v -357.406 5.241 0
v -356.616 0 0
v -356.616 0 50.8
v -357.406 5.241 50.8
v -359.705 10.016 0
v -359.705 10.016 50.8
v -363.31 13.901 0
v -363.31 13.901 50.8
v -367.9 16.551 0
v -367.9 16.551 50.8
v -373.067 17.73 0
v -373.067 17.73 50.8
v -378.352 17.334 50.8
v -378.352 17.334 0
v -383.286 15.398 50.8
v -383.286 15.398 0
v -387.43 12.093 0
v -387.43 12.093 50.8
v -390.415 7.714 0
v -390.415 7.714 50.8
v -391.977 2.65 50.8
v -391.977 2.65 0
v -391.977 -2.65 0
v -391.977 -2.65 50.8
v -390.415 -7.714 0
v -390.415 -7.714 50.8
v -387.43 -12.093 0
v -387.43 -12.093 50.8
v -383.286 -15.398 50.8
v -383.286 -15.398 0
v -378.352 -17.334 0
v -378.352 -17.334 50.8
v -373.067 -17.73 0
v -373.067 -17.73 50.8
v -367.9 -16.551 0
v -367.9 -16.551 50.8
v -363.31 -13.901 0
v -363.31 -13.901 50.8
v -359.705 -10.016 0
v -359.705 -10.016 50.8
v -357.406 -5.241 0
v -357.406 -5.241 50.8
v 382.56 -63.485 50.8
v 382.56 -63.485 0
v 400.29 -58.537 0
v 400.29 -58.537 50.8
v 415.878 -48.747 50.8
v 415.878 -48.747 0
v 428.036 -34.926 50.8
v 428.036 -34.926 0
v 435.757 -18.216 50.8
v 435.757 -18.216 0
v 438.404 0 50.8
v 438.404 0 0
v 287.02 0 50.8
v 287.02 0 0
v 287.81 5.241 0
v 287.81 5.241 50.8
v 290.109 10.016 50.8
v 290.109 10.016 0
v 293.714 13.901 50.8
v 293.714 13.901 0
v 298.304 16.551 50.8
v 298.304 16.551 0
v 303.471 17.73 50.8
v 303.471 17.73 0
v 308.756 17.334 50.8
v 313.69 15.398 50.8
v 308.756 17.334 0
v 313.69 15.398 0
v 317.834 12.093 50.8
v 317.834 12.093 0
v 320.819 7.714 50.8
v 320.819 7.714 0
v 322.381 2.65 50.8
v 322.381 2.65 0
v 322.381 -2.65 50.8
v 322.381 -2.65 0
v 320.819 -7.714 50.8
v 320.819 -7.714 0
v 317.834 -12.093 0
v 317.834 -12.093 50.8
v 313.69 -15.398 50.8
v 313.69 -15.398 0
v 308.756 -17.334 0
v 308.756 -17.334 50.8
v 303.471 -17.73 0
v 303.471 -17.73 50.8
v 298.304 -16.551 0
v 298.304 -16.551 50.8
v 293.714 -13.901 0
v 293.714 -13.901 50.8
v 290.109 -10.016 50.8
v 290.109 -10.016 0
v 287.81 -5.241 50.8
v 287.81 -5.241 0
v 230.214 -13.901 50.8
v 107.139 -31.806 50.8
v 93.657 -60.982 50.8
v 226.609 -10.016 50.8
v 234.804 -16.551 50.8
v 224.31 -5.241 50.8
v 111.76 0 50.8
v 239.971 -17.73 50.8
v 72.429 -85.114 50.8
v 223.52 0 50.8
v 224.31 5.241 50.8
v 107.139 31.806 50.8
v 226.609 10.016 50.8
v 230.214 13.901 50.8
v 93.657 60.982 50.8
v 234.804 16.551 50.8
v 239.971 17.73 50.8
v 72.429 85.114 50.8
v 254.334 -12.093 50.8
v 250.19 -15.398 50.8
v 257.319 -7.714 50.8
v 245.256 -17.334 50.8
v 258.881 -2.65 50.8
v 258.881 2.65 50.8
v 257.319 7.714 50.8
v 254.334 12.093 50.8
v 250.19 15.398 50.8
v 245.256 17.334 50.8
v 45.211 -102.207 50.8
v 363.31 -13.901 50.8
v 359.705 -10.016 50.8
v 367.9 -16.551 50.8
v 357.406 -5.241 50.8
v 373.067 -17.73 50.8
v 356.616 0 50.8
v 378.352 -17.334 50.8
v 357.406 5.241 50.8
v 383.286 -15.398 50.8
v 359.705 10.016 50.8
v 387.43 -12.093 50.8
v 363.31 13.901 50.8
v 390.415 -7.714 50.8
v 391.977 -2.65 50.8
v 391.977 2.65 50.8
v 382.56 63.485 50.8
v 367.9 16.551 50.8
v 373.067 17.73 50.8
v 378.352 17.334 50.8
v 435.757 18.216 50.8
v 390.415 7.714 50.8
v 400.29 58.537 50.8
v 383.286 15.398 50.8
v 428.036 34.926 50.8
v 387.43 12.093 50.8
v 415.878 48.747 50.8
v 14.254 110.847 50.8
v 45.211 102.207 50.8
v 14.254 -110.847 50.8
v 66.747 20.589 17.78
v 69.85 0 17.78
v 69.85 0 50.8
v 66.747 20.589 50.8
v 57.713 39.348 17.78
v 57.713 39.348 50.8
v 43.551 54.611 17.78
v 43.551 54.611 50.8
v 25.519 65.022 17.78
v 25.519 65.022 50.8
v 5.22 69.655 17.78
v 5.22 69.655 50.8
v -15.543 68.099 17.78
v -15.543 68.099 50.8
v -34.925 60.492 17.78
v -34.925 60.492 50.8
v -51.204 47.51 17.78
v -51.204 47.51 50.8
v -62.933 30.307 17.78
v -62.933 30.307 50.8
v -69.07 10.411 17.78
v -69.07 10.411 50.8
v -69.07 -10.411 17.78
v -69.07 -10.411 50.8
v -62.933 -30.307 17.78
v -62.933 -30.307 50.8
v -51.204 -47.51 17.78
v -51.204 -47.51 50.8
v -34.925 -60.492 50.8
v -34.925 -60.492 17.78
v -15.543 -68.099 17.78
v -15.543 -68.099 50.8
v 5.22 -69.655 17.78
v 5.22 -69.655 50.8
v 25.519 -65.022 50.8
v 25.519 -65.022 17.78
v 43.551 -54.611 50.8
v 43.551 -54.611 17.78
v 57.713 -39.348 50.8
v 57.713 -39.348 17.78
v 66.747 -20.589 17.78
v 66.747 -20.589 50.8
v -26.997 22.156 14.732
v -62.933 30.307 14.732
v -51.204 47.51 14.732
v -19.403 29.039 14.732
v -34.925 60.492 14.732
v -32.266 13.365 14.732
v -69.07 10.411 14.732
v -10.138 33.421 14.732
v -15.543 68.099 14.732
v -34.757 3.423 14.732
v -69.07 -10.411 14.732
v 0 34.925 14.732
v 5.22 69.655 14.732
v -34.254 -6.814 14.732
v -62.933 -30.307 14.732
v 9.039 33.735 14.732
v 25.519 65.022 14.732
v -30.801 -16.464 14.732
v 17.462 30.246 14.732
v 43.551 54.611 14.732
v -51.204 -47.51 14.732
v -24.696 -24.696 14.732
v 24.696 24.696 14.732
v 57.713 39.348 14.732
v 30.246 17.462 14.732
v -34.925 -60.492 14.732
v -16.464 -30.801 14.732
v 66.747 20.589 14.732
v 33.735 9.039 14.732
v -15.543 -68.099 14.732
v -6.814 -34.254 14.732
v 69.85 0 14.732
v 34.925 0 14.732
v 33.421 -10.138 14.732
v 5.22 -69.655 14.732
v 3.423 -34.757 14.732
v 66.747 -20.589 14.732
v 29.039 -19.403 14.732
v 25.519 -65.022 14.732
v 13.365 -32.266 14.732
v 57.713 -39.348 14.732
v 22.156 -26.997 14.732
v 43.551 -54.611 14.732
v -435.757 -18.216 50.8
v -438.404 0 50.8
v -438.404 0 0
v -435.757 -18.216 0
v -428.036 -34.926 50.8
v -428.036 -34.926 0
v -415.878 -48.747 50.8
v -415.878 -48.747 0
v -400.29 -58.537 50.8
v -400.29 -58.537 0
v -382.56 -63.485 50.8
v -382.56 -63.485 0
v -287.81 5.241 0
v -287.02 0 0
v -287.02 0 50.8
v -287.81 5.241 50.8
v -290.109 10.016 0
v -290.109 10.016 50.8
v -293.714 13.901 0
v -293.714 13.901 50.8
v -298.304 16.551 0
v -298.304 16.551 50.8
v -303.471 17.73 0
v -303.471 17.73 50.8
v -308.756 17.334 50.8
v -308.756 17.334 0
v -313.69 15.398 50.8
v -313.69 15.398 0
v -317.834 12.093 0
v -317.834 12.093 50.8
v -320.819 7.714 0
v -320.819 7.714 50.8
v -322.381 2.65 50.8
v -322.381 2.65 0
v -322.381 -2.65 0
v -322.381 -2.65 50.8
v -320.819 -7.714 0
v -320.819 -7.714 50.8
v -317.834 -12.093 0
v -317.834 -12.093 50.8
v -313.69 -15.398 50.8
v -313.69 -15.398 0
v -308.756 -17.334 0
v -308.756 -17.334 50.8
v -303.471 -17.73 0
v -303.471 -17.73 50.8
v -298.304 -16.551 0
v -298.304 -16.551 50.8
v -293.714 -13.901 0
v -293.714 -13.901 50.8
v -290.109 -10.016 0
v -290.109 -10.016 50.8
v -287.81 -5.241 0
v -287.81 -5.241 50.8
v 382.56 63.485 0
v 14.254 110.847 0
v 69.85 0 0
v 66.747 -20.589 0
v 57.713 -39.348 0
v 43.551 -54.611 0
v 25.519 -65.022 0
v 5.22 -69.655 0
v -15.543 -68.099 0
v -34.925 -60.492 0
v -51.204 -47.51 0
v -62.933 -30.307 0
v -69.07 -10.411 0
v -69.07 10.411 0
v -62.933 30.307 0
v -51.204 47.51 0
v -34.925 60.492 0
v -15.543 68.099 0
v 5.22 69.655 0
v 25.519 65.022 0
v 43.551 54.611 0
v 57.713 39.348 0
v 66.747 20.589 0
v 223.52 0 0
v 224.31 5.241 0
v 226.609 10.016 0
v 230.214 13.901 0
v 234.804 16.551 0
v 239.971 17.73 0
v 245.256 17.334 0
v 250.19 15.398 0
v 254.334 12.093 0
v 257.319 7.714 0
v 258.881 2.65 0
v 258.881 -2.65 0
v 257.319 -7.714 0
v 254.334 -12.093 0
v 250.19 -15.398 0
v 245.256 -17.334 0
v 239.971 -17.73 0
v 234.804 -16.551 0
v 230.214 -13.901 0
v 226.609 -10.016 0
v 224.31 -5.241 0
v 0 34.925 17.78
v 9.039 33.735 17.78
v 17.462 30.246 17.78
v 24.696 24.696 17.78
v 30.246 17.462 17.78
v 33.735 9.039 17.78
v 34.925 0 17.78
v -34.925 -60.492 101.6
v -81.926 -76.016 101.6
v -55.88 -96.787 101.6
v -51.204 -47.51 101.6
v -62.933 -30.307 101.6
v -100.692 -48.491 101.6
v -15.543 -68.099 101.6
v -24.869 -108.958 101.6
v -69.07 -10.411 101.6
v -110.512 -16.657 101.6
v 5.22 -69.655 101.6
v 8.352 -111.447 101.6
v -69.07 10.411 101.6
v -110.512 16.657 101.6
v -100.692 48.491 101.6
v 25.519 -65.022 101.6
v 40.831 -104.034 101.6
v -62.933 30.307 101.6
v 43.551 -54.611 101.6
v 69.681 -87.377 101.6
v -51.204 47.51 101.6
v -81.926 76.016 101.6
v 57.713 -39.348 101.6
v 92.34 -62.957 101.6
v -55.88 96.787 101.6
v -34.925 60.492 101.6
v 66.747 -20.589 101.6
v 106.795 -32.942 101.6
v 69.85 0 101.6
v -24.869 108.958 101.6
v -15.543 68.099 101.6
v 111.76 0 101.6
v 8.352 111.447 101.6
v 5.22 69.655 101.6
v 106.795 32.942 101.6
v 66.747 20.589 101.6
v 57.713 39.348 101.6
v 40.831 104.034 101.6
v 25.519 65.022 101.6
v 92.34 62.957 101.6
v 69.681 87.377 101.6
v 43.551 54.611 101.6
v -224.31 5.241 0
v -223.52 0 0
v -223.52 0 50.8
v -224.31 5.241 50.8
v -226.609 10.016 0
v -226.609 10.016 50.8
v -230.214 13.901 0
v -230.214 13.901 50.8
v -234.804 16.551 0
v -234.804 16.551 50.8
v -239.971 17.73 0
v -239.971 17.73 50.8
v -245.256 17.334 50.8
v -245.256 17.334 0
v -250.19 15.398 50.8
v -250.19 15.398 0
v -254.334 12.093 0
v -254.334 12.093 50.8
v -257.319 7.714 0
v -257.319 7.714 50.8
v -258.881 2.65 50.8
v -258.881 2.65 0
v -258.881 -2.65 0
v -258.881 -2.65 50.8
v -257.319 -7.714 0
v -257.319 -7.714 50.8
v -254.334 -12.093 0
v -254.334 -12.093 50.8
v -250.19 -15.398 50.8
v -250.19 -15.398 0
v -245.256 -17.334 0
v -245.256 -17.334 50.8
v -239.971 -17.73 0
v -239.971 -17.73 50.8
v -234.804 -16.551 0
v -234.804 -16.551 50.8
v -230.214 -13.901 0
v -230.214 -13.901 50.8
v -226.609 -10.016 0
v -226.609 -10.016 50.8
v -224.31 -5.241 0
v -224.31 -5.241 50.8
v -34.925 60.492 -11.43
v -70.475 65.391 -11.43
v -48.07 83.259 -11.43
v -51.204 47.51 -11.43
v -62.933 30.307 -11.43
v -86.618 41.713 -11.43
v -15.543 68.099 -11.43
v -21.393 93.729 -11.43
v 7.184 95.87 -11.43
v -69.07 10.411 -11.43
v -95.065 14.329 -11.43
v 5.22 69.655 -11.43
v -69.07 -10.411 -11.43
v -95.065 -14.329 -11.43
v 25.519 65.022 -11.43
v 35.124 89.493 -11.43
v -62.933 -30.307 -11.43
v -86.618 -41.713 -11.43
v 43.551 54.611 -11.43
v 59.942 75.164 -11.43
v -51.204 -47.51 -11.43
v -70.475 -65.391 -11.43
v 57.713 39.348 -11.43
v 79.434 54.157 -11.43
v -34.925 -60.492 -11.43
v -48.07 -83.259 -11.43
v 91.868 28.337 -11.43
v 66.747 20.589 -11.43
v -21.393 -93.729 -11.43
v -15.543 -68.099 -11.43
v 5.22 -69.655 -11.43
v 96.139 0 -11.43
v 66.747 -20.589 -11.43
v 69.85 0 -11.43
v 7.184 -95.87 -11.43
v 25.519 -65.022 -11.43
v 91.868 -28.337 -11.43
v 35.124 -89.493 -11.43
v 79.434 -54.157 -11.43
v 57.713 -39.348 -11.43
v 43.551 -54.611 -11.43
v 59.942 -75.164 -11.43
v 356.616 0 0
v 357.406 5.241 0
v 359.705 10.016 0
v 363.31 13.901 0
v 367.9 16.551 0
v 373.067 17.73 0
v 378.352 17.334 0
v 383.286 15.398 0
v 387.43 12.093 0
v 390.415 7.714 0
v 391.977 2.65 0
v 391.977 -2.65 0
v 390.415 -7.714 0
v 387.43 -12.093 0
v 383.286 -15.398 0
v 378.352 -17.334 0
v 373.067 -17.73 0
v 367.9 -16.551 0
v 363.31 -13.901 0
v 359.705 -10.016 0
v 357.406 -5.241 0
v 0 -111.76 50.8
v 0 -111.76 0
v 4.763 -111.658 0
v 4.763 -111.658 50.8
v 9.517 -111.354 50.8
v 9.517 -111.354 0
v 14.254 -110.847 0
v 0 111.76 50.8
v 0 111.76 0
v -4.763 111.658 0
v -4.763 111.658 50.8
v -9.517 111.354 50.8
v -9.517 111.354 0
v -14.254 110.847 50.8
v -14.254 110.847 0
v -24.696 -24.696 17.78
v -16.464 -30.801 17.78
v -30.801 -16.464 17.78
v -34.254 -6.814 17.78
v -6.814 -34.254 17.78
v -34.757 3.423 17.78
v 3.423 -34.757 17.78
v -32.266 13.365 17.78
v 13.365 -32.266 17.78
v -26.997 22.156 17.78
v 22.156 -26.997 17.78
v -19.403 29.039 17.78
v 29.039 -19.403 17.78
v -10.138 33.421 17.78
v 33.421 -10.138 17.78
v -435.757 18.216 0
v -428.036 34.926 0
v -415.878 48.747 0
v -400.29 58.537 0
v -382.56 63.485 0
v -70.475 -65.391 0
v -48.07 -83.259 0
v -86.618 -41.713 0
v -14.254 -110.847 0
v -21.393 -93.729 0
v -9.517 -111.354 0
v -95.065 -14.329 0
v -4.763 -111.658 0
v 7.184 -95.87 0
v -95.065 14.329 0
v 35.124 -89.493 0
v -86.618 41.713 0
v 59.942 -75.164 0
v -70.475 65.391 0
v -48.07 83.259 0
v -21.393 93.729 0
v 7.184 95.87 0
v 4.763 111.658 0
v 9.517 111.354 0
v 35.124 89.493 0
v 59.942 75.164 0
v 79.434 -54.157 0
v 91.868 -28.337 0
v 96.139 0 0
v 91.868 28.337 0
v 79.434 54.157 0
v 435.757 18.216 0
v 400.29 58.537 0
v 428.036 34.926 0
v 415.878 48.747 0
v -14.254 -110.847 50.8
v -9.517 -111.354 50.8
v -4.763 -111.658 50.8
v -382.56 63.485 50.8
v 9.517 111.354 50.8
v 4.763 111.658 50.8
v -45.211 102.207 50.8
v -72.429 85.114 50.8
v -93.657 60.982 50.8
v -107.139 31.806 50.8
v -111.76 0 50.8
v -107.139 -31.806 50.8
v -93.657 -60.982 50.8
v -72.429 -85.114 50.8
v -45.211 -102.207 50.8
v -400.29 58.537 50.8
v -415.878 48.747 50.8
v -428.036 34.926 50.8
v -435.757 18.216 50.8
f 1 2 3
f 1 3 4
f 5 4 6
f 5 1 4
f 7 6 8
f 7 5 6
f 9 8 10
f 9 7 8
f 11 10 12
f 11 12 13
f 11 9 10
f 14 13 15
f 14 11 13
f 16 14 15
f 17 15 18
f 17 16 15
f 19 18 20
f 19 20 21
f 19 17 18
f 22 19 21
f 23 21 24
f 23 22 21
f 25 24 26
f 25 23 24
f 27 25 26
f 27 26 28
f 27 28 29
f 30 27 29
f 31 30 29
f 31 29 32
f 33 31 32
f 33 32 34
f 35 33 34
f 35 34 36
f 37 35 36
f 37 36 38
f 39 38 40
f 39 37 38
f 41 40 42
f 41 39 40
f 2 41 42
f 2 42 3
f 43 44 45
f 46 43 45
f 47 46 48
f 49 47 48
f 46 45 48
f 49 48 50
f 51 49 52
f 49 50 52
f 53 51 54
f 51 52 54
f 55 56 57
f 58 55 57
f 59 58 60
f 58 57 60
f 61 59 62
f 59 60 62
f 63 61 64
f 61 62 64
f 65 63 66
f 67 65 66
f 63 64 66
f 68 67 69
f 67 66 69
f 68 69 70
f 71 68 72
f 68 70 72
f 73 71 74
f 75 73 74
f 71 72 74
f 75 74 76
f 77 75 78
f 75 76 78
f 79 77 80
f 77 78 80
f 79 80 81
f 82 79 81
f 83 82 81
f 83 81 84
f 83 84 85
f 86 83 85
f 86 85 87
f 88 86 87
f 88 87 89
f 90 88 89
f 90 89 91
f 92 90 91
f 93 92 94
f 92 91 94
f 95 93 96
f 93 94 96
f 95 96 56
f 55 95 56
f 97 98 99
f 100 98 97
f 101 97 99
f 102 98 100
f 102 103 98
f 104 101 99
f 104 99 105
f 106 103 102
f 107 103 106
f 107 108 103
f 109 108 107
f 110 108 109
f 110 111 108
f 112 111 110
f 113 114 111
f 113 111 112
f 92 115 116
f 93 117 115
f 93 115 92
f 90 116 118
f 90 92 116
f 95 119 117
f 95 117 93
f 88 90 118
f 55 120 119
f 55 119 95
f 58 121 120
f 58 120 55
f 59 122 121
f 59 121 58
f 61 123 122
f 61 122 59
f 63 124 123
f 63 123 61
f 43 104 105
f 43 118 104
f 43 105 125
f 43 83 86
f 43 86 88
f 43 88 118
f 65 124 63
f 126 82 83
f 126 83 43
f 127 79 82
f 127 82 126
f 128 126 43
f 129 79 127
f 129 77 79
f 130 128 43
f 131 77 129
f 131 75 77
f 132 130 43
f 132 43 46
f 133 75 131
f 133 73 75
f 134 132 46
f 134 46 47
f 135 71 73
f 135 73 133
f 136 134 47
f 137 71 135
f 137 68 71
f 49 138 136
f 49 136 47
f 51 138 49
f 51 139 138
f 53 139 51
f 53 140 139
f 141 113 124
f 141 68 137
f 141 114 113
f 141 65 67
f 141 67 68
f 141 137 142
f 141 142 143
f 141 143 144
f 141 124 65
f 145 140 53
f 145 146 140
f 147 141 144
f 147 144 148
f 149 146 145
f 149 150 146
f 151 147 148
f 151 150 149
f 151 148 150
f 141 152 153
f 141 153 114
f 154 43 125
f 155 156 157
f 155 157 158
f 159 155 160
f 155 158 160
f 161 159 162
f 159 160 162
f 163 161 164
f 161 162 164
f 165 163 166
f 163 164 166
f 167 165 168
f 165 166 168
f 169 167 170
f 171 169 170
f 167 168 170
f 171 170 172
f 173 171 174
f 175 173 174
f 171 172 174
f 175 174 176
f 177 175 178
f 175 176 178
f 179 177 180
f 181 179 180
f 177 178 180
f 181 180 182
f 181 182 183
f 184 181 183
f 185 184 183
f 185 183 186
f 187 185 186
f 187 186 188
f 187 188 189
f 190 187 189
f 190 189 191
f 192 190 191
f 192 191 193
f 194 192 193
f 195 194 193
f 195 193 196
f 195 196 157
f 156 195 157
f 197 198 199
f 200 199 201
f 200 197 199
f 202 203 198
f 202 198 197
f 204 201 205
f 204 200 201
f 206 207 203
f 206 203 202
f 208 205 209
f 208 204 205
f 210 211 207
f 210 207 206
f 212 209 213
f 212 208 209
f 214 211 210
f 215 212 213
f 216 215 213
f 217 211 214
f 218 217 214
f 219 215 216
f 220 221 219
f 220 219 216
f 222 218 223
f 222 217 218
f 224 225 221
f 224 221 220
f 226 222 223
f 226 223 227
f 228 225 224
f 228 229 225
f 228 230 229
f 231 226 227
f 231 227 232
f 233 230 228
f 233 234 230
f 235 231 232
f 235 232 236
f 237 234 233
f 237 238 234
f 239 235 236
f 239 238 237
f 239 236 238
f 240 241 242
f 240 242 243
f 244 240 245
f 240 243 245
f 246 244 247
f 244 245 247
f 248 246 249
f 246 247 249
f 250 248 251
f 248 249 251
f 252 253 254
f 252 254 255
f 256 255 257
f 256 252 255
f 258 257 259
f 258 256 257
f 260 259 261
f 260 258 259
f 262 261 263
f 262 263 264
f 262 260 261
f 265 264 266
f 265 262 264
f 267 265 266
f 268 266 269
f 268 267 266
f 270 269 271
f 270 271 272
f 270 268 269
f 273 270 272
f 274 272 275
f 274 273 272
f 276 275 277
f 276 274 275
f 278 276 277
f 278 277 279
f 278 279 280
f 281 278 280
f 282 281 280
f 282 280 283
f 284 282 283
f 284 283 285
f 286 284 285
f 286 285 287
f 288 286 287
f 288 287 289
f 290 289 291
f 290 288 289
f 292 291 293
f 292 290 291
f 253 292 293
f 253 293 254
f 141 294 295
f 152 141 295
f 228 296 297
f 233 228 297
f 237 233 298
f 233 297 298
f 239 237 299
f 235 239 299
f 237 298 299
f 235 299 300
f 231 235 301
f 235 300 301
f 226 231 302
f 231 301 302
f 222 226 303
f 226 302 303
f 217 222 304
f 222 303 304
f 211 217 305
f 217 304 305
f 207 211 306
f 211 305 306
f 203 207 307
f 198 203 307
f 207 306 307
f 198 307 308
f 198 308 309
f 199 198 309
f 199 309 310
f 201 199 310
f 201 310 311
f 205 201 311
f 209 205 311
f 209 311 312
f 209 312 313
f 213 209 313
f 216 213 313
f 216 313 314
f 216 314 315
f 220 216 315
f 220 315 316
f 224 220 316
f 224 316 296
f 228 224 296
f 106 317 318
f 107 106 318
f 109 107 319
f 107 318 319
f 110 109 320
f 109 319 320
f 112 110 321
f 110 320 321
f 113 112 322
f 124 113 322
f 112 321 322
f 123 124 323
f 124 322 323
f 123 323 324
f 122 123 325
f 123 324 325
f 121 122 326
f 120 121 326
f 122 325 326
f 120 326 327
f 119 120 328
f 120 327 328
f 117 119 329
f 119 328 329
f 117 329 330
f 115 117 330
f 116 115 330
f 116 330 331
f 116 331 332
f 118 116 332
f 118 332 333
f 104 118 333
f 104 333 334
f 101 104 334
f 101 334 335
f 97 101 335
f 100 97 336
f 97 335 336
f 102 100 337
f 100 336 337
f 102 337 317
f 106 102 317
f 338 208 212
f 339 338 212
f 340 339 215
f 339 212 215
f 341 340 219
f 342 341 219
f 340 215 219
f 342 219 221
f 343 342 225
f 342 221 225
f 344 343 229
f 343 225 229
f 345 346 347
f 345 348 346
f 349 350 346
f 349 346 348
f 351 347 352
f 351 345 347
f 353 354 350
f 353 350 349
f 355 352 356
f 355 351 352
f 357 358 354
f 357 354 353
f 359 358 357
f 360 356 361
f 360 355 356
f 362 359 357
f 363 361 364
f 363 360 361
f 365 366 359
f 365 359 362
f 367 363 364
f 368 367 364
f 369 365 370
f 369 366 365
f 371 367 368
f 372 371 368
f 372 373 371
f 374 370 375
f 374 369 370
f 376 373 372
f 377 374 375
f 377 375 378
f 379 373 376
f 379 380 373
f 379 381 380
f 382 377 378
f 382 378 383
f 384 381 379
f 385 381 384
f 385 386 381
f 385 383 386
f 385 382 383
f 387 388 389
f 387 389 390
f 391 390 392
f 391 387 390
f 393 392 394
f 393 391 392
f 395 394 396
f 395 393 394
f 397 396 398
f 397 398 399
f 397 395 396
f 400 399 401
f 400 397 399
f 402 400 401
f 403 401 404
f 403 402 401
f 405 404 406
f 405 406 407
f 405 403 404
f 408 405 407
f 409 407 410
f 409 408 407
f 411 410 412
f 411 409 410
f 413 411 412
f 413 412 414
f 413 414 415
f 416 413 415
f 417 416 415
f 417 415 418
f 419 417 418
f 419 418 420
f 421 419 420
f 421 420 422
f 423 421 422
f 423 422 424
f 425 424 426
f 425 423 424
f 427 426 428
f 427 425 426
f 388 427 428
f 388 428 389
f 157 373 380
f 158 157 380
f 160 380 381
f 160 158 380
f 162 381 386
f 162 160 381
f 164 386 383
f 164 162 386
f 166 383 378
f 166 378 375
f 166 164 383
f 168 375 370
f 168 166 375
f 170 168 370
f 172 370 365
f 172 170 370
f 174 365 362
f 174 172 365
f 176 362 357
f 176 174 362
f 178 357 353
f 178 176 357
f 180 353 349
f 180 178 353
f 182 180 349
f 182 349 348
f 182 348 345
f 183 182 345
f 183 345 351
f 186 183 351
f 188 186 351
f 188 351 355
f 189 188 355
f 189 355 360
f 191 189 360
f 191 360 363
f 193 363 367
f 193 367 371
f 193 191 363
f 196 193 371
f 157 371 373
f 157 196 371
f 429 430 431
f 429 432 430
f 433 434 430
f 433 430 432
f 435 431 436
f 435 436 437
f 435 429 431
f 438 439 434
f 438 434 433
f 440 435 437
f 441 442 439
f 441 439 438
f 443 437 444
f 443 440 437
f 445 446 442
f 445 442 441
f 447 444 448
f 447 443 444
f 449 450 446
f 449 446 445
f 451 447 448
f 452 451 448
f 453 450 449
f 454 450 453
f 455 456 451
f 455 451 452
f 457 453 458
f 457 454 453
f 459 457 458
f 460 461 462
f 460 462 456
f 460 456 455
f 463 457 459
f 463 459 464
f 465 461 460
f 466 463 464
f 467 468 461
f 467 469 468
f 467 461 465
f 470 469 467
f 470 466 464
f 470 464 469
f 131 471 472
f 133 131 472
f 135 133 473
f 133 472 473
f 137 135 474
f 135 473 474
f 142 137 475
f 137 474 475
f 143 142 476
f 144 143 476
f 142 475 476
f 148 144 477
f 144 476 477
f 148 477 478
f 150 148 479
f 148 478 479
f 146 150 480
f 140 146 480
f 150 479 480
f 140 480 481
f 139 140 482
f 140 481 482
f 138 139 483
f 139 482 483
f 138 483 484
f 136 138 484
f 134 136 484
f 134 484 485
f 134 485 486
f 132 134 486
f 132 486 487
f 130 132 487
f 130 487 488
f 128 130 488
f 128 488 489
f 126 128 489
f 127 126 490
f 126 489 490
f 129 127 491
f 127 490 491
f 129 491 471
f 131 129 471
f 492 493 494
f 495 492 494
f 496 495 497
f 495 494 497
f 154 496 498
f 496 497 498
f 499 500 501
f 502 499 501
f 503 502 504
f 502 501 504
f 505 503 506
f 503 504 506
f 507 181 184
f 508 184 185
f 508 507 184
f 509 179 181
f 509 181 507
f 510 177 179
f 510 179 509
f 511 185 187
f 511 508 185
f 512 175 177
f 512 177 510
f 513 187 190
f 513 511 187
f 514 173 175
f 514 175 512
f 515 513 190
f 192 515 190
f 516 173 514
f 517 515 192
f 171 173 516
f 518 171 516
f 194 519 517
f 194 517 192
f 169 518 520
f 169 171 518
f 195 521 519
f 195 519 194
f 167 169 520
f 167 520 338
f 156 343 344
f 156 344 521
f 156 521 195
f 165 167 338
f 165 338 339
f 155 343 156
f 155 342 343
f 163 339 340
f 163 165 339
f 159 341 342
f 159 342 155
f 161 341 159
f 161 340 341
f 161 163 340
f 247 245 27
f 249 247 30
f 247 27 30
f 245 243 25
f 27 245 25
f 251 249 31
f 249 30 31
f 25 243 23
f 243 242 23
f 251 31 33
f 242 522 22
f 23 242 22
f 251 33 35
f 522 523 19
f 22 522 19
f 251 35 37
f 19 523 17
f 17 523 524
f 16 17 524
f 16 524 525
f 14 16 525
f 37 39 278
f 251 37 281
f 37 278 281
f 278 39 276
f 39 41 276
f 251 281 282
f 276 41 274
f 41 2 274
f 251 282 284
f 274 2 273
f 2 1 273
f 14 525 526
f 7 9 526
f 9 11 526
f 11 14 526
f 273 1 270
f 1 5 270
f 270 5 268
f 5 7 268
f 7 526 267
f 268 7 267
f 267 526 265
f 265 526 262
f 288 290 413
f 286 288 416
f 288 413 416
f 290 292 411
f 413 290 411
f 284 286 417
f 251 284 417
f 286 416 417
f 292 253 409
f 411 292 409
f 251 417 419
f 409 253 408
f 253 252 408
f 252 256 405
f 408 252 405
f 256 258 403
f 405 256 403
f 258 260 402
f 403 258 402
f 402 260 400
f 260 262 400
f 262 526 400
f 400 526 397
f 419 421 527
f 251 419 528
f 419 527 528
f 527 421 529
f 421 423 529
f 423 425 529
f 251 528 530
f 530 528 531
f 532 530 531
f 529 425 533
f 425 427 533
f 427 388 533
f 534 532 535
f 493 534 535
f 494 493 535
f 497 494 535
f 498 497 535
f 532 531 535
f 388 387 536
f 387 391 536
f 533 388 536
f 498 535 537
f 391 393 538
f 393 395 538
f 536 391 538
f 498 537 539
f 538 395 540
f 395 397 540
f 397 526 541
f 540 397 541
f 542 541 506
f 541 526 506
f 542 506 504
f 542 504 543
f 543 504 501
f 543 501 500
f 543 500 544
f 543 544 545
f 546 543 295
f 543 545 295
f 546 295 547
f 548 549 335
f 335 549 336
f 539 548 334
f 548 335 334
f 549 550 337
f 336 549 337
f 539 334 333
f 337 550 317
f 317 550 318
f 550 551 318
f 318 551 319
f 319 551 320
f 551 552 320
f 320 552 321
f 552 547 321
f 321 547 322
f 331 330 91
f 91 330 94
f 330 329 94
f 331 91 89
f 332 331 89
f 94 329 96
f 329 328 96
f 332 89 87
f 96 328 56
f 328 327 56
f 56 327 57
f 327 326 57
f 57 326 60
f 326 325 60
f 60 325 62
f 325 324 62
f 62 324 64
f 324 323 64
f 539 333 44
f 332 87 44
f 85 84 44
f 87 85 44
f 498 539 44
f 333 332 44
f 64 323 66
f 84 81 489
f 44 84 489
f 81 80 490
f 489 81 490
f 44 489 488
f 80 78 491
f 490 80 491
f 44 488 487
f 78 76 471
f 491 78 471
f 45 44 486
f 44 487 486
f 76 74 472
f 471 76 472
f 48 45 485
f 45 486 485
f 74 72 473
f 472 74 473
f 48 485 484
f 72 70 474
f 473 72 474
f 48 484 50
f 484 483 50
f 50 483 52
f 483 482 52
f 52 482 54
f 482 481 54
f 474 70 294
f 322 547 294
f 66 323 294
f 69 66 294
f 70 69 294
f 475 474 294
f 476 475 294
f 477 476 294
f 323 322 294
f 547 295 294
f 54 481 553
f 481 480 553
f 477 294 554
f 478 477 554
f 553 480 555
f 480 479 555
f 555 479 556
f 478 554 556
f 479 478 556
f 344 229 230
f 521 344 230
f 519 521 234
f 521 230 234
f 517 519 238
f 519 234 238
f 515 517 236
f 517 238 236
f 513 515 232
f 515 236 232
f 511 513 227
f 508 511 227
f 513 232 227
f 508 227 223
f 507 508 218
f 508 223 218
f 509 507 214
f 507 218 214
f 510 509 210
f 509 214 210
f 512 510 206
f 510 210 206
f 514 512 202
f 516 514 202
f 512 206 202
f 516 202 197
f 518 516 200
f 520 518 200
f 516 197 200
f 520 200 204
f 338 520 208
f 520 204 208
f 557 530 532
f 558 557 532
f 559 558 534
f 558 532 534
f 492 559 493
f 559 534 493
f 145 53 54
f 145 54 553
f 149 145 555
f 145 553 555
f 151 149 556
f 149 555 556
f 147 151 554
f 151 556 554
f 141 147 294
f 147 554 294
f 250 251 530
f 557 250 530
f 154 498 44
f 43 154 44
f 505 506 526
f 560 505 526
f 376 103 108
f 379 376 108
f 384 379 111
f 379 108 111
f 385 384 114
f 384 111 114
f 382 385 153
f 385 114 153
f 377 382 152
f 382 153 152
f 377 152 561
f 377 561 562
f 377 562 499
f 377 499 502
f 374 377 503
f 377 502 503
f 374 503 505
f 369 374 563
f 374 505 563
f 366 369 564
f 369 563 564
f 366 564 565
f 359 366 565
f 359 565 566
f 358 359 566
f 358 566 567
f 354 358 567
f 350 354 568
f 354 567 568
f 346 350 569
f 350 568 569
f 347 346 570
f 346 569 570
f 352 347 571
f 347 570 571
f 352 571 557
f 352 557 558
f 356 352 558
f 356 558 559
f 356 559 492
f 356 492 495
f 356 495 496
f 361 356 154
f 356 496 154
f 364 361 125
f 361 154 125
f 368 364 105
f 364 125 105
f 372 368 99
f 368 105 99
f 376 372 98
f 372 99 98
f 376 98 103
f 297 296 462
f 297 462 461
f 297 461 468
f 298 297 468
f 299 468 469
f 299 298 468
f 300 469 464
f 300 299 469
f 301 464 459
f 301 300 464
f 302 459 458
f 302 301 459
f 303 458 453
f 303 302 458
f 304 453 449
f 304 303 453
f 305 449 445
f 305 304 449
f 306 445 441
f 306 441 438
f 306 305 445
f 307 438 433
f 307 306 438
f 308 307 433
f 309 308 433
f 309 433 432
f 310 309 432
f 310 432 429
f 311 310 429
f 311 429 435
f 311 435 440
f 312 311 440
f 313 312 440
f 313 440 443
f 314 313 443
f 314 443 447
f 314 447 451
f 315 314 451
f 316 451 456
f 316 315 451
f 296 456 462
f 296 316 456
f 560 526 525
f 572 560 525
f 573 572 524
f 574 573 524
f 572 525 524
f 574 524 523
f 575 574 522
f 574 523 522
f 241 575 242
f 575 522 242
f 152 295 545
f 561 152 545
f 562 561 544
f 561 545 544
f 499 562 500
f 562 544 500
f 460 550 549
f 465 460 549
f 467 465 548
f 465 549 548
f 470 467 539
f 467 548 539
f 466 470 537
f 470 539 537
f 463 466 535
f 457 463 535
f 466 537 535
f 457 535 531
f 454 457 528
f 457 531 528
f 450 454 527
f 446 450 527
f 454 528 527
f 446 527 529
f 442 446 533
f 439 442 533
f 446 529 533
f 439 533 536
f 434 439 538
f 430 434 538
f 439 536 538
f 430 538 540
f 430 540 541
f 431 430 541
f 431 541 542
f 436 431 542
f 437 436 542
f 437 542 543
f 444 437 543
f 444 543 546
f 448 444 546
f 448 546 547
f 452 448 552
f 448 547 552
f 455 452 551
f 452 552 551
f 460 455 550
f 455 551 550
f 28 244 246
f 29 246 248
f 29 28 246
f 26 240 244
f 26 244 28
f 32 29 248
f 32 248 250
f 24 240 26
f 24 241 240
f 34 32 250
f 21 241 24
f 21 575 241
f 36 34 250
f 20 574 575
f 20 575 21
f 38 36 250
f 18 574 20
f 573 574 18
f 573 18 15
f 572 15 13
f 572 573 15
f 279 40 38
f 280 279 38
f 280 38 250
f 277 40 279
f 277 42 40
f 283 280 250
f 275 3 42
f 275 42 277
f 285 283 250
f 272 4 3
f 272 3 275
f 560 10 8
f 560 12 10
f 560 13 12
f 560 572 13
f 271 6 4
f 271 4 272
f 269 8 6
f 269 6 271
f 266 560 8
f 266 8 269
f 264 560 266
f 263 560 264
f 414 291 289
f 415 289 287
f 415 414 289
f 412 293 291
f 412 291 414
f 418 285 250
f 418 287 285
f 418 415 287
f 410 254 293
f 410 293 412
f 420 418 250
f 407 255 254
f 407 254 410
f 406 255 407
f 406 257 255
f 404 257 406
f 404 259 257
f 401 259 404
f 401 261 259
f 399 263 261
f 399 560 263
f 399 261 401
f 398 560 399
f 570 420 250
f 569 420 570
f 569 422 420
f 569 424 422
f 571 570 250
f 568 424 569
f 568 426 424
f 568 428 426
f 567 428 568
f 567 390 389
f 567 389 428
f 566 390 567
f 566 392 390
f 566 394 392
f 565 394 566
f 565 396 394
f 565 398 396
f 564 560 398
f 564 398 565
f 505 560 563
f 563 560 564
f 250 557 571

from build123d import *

# Parameters (mm, degrees)
F0_R     = 17.78
F1_DEPTH = 50.8
F2_R     = 111.76
F2_R_2   = 69.85
F3_DEPTH = 50.8
F4_R     = 69.85
F5_DEPTH = 83.82
F6_R     = 96.139
F6_R_2   = 69.85
F7_DEPTH = 11.43
F8_R     = 69.85
F9_DEPTH = 26.162


with BuildPart() as f1:
    # F0 (on Top) → F1 (new body)
    with BuildSketch(Plane.XY):
        with BuildLine():
            Line((223.52, 0), (34.925, 0))
            ThreePointArc((34.925, 0), (-24.695704, -24.695704), (0, 34.925))
            Line((0, 34.925), (0, 111.76))
            ThreePointArc((0, 111.76), (-7.141761, 111.531578), (-14.254328, 110.847245))
            Line((-14.254328, 110.847245), (-382.559843, 63.48524))
            ThreePointArc((-382.559843, 63.48524), (-422.45625, 42.275719), (-438.404, 0))
            ThreePointArc((-438.404, 0), (-422.45625, -42.275719), (-382.559843, -63.48524))
            Line((-382.559843, -63.48524), (-14.254328, -110.847245))
            ThreePointArc((-14.254328, -110.847245), (-7.141761, -111.531578), (0, -111.76))
            ThreePointArc((0, -111.76), (7.141761, -111.531578), (14.254328, -110.847245))
            Line((14.254328, -110.847245), (382.559843, -63.48524))
            ThreePointArc((382.559843, -63.48524), (422.45625, -42.275719), (438.404, 0))
            Line((438.404, 0), (392.176, 0))
            ThreePointArc((392.176, 0), (374.396, -17.78), (356.616, 0))
            Line((356.616, 0), (322.58, 0))
            ThreePointArc((322.58, 0), (304.8, -17.78), (287.02, 0))
            Line((287.02, 0), (259.08, 0))
            ThreePointArc((259.08, 0), (241.3, -17.78), (223.52, 0))
        make_face()
        with Locations((-374.396, 0)):
            Circle(F0_R, mode=Mode.SUBTRACT)
        with Locations((-304.8, 0)):
            Circle(F0_R, mode=Mode.SUBTRACT)
        with Locations((-241.3, 0)):
            Circle(F0_R, mode=Mode.SUBTRACT)
        with BuildLine():
            ThreePointArc((0, 34.925), (24.695704, 24.695704), (34.925, 0))
            Line((34.925, 0), (223.52, 0))
            ThreePointArc((223.52, 0), (241.3, 17.78), (259.08, 0))
            Line((259.08, 0), (287.02, 0))
            ThreePointArc((287.02, 0), (304.8, 17.78), (322.58, 0))
            Line((322.58, 0), (356.616, 0))
            ThreePointArc((356.616, 0), (374.396, 17.78), (392.176, 0))
            Line((392.176, 0), (438.404, 0))
            ThreePointArc((438.404, 0), (422.45625, 42.275719), (382.559843, 63.48524))
            Line((382.559843, 63.48524), (14.254328, 110.847245))
            ThreePointArc((14.254328, 110.847245), (7.141761, 111.531578), (0, 111.76))
            Line((0, 111.76), (0, 34.925))
        make_face()
    extrude(amount=F1_DEPTH)

    # F2 (on face) → F3 (join)
    with BuildSketch(Plane.XY.offset(50.8)):
        Circle(F2_R)
        Circle(F2_R_2, mode=Mode.SUBTRACT)
    extrude(amount=F3_DEPTH)

    # F4 (on face) → F5 (cut)
    with BuildSketch(Plane.XY.offset(101.6)):
        Circle(F4_R)
    extrude(amount=-F5_DEPTH, mode=Mode.SUBTRACT)

    # F6 (on face) → F7 (join)
    with BuildSketch(Plane(origin=(0, 0, 0), x_dir=(1, 0, 0), z_dir=(0, 0, -1))):
        Circle(F6_R)
        Circle(F6_R_2, mode=Mode.SUBTRACT)
    extrude(amount=F7_DEPTH)

    # F8 (on face) → F9 (cut)
    with BuildSketch(Plane(origin=(0, 0, -11.43), x_dir=(1, 0, 0), z_dir=(0, 0, -1))):
        Circle(F8_R)
    extrude(amount=-F9_DEPTH, mode=Mode.SUBTRACT)


solid = f1.part
